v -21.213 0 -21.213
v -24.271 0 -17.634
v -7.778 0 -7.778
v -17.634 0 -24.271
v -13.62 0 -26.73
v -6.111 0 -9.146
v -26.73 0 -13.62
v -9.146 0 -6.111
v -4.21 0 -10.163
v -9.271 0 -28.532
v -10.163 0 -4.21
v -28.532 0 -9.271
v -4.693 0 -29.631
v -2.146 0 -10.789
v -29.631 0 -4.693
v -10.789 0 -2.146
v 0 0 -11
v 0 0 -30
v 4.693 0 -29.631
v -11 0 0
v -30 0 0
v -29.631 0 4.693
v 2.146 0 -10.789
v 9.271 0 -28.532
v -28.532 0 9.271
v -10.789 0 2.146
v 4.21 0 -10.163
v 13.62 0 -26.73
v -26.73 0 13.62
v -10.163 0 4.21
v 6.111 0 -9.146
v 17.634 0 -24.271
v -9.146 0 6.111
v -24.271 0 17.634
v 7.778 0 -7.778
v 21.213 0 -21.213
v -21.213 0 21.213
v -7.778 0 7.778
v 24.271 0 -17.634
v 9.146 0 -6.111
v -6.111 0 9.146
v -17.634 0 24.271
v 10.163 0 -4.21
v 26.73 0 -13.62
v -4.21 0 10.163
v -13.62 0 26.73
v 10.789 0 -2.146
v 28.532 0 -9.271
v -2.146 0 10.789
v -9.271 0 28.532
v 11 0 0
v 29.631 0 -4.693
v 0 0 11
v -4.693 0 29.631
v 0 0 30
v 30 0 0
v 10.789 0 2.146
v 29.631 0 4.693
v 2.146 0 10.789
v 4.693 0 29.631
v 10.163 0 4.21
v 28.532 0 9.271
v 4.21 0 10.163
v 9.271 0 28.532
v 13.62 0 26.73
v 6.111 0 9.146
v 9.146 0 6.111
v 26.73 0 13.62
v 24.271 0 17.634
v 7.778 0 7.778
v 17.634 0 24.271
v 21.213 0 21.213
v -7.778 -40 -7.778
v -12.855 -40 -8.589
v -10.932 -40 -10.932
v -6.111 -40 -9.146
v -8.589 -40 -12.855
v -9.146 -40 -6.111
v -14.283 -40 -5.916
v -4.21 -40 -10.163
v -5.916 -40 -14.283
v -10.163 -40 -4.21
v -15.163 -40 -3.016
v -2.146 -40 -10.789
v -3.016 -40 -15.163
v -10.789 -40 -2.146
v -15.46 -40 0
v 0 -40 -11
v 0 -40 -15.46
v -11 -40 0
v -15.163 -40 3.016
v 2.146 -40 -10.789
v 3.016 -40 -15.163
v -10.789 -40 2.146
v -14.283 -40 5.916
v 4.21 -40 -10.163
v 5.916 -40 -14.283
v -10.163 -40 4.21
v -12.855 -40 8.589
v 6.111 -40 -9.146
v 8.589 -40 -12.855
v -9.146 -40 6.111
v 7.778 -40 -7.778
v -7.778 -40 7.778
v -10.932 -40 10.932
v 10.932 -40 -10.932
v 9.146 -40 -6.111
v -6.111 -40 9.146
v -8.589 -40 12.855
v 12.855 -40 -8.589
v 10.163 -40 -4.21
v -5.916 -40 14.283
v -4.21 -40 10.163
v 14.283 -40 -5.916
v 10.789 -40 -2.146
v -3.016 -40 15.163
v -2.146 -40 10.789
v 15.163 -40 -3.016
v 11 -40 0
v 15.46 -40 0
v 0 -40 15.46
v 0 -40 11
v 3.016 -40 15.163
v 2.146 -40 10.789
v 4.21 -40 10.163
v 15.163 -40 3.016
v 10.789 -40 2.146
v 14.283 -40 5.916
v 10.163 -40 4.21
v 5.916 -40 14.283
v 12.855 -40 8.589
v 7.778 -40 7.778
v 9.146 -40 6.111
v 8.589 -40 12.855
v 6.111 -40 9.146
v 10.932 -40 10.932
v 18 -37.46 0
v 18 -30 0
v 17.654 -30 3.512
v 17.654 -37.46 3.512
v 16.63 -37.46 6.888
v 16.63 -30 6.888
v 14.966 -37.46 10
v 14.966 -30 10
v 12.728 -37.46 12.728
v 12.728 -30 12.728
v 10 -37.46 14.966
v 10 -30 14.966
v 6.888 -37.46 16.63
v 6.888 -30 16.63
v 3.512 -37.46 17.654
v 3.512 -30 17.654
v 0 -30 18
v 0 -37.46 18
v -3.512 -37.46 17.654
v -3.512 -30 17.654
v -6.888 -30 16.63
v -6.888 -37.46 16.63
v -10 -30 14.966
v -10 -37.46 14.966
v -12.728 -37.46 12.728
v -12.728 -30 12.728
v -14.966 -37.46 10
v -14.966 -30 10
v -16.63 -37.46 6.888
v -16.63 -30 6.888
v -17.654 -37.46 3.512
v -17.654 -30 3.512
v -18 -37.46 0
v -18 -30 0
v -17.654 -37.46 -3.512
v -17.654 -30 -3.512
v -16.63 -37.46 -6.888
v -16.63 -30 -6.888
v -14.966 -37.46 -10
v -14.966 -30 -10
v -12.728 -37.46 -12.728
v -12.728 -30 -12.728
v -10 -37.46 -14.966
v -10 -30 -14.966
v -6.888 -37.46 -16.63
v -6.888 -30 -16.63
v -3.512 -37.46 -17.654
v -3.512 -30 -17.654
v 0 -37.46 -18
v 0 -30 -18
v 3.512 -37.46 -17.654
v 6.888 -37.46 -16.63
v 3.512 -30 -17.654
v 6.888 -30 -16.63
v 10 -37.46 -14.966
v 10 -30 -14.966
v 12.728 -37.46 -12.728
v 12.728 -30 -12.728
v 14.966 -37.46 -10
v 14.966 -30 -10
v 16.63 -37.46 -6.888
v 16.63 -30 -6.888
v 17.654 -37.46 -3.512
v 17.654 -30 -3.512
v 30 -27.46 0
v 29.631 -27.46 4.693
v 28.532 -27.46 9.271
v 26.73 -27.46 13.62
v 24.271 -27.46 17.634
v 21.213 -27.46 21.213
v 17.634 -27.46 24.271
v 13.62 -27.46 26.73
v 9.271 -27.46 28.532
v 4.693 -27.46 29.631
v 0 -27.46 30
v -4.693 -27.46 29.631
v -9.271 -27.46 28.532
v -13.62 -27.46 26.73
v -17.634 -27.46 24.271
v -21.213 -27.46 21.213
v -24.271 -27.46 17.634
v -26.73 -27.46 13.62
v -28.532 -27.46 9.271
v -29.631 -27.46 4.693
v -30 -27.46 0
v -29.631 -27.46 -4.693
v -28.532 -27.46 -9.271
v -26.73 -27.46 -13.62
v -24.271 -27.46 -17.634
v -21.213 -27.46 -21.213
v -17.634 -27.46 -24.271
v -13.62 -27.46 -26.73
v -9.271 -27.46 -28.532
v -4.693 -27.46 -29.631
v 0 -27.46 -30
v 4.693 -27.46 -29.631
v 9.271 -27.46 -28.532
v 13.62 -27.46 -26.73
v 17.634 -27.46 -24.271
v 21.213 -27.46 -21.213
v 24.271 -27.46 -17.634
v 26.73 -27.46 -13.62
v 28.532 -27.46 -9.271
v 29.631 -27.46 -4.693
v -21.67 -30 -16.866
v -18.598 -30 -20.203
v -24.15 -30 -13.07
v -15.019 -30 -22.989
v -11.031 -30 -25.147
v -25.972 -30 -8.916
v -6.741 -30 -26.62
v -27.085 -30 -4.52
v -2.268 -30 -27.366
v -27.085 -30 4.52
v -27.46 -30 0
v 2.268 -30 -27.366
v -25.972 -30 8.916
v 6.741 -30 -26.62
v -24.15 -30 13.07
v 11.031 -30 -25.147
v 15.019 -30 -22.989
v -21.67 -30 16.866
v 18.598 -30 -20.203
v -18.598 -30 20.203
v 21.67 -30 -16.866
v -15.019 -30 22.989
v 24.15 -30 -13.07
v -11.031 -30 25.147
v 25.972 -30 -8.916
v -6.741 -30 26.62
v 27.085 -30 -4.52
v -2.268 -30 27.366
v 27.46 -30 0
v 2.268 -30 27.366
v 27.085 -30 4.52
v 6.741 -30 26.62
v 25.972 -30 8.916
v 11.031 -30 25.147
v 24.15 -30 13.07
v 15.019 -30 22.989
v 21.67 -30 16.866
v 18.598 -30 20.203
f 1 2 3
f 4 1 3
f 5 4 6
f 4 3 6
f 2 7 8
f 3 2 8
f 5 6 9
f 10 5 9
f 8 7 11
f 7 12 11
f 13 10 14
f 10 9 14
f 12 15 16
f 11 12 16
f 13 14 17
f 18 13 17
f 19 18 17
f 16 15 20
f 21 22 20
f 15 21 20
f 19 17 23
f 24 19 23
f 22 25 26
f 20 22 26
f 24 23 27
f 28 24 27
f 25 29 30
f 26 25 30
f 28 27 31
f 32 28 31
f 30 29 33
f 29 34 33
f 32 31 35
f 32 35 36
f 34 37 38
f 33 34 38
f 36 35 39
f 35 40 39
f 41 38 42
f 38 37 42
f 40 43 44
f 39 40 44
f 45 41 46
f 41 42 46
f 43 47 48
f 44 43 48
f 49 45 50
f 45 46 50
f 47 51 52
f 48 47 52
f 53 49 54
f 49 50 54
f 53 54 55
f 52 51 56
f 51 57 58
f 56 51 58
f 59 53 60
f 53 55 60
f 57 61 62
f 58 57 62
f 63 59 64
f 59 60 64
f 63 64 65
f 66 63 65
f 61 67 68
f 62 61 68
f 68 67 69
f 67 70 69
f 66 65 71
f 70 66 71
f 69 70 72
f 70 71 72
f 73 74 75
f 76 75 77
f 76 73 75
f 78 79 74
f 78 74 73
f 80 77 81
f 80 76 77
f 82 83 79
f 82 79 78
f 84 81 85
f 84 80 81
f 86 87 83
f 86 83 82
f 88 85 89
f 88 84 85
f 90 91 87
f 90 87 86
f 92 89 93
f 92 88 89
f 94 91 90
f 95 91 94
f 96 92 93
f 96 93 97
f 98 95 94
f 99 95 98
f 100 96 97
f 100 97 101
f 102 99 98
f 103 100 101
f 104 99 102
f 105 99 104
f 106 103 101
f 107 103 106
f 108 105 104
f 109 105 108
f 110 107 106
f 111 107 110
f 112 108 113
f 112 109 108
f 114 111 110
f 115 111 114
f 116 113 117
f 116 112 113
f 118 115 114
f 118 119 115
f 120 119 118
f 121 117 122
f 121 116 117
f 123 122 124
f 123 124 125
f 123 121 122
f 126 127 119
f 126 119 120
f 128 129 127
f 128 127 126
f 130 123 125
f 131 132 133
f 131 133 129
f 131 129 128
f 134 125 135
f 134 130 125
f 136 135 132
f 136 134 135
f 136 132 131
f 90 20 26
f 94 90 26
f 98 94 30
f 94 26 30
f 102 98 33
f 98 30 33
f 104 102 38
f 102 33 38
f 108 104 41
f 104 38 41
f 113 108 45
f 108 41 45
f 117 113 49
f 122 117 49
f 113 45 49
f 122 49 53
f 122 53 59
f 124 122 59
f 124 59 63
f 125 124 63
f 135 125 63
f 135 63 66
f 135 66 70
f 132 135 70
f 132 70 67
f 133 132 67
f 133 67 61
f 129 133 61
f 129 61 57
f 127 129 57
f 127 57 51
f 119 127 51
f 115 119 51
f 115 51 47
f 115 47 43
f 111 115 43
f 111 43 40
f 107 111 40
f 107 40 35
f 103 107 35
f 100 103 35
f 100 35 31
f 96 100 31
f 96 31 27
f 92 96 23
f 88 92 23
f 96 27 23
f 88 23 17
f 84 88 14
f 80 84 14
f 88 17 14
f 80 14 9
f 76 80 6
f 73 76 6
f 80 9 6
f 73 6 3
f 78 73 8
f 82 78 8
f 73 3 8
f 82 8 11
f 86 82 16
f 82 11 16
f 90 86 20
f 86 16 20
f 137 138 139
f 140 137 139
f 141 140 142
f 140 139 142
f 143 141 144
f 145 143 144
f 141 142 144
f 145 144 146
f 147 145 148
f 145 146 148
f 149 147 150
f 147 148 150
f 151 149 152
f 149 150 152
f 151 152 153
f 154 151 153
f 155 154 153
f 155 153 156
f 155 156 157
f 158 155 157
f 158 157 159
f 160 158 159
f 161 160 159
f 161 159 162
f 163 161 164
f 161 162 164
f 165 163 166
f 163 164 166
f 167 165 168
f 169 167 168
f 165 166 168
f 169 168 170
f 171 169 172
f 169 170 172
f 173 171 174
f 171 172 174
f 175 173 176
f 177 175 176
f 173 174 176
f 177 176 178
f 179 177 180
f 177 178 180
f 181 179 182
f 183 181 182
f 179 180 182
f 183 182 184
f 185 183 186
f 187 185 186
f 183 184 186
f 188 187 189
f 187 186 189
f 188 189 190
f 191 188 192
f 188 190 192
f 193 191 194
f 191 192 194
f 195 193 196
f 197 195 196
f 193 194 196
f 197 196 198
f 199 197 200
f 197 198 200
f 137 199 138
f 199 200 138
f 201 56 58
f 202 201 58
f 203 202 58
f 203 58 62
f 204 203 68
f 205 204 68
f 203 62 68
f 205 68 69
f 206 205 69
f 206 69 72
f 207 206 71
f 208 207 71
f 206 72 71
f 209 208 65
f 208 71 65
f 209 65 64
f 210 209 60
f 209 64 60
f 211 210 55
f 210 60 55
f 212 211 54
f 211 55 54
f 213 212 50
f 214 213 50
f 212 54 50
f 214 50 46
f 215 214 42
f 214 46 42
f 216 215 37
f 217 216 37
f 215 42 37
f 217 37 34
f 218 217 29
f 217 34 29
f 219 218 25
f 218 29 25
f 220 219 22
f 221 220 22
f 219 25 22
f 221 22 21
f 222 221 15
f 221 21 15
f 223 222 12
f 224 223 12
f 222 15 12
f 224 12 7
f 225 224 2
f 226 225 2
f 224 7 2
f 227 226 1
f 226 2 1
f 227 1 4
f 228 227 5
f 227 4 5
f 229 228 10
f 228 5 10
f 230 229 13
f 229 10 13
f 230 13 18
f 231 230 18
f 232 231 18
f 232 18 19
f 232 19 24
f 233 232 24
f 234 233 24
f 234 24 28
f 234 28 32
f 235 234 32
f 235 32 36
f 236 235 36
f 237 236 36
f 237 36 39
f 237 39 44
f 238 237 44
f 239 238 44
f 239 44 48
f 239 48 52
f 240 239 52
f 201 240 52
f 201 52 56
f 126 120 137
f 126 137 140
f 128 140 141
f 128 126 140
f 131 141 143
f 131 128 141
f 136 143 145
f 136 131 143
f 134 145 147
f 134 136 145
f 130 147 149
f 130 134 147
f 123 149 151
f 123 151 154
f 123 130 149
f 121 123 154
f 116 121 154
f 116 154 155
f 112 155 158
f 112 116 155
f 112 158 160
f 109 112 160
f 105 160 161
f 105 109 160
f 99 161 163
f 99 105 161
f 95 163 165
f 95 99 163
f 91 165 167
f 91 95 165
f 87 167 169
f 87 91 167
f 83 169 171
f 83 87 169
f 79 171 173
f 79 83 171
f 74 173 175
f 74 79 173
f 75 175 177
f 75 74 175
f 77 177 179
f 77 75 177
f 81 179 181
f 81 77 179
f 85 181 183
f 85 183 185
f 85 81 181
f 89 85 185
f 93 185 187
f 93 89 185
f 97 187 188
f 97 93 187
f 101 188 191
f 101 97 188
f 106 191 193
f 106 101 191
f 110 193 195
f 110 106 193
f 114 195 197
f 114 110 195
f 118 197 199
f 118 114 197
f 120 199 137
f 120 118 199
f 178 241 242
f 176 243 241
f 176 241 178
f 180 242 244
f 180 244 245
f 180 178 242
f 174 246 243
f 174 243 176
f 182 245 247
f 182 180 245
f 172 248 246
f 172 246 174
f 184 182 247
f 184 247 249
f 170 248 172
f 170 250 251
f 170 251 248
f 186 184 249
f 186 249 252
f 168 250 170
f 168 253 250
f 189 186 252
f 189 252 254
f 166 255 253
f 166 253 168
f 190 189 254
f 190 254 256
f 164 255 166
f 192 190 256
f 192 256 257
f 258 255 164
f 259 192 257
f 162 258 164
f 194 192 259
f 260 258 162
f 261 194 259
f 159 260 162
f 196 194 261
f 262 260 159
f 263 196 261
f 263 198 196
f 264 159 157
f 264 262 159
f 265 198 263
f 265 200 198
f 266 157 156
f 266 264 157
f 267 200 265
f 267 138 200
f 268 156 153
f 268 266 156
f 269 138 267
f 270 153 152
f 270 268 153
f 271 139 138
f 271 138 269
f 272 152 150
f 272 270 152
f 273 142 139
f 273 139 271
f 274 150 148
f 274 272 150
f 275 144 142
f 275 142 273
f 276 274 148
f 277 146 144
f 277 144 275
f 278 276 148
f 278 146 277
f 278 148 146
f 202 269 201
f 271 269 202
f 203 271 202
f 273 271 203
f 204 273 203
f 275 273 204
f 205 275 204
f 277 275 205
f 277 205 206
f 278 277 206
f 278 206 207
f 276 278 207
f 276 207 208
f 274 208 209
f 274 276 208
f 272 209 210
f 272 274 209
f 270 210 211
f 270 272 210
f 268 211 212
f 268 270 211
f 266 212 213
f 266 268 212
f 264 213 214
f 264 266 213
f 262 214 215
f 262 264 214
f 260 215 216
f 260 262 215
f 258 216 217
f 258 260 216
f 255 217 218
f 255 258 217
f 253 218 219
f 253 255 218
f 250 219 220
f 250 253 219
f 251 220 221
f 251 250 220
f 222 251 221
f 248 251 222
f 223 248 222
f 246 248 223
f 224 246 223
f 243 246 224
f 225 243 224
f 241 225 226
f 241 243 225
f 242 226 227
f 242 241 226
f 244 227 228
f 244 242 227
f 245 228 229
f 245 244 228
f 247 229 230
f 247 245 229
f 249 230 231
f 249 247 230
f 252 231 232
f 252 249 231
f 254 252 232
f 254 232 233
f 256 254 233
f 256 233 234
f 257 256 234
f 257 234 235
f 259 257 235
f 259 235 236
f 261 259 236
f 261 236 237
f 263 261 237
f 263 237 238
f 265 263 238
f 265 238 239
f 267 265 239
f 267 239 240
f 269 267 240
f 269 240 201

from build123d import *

# Parameters (mm, degrees)
F0_R     = 30
F1_DEPTH = 30
F2_R     = 18
F3_DEPTH = 10
F5_D     = 22
F6_SIZE  = 2.54
F7_SIZE  = 2.54


with BuildPart() as f1:
    # F0 (on Front) → F1 (new body)
    with BuildSketch(Plane.XZ):
        Circle(F0_R)
    extrude(amount=F1_DEPTH)

    # F2 (on face) → F3 (join)
    with BuildSketch(Plane.XZ.offset(30)):
        Circle(F2_R)
    extrude(amount=F3_DEPTH)

    # F5 (through all)
    with Locations(Plane.XZ.offset(40)):
        with Locations((0, 0)):
            Hole(F5_D / 2)

    # F6
    f6_edges = [f1.edges().sort_by_distance(p)[0] for p in [
        (-30, -30, 0),
    ]]
    chamfer(f6_edges, length=F6_SIZE)

    # F7
    f7_edges = [f1.edges().sort_by_distance(p)[0] for p in [
        (-18, -40, 0),
    ]]
    chamfer(f7_edges, length=F7_SIZE)


solid = f1.part
